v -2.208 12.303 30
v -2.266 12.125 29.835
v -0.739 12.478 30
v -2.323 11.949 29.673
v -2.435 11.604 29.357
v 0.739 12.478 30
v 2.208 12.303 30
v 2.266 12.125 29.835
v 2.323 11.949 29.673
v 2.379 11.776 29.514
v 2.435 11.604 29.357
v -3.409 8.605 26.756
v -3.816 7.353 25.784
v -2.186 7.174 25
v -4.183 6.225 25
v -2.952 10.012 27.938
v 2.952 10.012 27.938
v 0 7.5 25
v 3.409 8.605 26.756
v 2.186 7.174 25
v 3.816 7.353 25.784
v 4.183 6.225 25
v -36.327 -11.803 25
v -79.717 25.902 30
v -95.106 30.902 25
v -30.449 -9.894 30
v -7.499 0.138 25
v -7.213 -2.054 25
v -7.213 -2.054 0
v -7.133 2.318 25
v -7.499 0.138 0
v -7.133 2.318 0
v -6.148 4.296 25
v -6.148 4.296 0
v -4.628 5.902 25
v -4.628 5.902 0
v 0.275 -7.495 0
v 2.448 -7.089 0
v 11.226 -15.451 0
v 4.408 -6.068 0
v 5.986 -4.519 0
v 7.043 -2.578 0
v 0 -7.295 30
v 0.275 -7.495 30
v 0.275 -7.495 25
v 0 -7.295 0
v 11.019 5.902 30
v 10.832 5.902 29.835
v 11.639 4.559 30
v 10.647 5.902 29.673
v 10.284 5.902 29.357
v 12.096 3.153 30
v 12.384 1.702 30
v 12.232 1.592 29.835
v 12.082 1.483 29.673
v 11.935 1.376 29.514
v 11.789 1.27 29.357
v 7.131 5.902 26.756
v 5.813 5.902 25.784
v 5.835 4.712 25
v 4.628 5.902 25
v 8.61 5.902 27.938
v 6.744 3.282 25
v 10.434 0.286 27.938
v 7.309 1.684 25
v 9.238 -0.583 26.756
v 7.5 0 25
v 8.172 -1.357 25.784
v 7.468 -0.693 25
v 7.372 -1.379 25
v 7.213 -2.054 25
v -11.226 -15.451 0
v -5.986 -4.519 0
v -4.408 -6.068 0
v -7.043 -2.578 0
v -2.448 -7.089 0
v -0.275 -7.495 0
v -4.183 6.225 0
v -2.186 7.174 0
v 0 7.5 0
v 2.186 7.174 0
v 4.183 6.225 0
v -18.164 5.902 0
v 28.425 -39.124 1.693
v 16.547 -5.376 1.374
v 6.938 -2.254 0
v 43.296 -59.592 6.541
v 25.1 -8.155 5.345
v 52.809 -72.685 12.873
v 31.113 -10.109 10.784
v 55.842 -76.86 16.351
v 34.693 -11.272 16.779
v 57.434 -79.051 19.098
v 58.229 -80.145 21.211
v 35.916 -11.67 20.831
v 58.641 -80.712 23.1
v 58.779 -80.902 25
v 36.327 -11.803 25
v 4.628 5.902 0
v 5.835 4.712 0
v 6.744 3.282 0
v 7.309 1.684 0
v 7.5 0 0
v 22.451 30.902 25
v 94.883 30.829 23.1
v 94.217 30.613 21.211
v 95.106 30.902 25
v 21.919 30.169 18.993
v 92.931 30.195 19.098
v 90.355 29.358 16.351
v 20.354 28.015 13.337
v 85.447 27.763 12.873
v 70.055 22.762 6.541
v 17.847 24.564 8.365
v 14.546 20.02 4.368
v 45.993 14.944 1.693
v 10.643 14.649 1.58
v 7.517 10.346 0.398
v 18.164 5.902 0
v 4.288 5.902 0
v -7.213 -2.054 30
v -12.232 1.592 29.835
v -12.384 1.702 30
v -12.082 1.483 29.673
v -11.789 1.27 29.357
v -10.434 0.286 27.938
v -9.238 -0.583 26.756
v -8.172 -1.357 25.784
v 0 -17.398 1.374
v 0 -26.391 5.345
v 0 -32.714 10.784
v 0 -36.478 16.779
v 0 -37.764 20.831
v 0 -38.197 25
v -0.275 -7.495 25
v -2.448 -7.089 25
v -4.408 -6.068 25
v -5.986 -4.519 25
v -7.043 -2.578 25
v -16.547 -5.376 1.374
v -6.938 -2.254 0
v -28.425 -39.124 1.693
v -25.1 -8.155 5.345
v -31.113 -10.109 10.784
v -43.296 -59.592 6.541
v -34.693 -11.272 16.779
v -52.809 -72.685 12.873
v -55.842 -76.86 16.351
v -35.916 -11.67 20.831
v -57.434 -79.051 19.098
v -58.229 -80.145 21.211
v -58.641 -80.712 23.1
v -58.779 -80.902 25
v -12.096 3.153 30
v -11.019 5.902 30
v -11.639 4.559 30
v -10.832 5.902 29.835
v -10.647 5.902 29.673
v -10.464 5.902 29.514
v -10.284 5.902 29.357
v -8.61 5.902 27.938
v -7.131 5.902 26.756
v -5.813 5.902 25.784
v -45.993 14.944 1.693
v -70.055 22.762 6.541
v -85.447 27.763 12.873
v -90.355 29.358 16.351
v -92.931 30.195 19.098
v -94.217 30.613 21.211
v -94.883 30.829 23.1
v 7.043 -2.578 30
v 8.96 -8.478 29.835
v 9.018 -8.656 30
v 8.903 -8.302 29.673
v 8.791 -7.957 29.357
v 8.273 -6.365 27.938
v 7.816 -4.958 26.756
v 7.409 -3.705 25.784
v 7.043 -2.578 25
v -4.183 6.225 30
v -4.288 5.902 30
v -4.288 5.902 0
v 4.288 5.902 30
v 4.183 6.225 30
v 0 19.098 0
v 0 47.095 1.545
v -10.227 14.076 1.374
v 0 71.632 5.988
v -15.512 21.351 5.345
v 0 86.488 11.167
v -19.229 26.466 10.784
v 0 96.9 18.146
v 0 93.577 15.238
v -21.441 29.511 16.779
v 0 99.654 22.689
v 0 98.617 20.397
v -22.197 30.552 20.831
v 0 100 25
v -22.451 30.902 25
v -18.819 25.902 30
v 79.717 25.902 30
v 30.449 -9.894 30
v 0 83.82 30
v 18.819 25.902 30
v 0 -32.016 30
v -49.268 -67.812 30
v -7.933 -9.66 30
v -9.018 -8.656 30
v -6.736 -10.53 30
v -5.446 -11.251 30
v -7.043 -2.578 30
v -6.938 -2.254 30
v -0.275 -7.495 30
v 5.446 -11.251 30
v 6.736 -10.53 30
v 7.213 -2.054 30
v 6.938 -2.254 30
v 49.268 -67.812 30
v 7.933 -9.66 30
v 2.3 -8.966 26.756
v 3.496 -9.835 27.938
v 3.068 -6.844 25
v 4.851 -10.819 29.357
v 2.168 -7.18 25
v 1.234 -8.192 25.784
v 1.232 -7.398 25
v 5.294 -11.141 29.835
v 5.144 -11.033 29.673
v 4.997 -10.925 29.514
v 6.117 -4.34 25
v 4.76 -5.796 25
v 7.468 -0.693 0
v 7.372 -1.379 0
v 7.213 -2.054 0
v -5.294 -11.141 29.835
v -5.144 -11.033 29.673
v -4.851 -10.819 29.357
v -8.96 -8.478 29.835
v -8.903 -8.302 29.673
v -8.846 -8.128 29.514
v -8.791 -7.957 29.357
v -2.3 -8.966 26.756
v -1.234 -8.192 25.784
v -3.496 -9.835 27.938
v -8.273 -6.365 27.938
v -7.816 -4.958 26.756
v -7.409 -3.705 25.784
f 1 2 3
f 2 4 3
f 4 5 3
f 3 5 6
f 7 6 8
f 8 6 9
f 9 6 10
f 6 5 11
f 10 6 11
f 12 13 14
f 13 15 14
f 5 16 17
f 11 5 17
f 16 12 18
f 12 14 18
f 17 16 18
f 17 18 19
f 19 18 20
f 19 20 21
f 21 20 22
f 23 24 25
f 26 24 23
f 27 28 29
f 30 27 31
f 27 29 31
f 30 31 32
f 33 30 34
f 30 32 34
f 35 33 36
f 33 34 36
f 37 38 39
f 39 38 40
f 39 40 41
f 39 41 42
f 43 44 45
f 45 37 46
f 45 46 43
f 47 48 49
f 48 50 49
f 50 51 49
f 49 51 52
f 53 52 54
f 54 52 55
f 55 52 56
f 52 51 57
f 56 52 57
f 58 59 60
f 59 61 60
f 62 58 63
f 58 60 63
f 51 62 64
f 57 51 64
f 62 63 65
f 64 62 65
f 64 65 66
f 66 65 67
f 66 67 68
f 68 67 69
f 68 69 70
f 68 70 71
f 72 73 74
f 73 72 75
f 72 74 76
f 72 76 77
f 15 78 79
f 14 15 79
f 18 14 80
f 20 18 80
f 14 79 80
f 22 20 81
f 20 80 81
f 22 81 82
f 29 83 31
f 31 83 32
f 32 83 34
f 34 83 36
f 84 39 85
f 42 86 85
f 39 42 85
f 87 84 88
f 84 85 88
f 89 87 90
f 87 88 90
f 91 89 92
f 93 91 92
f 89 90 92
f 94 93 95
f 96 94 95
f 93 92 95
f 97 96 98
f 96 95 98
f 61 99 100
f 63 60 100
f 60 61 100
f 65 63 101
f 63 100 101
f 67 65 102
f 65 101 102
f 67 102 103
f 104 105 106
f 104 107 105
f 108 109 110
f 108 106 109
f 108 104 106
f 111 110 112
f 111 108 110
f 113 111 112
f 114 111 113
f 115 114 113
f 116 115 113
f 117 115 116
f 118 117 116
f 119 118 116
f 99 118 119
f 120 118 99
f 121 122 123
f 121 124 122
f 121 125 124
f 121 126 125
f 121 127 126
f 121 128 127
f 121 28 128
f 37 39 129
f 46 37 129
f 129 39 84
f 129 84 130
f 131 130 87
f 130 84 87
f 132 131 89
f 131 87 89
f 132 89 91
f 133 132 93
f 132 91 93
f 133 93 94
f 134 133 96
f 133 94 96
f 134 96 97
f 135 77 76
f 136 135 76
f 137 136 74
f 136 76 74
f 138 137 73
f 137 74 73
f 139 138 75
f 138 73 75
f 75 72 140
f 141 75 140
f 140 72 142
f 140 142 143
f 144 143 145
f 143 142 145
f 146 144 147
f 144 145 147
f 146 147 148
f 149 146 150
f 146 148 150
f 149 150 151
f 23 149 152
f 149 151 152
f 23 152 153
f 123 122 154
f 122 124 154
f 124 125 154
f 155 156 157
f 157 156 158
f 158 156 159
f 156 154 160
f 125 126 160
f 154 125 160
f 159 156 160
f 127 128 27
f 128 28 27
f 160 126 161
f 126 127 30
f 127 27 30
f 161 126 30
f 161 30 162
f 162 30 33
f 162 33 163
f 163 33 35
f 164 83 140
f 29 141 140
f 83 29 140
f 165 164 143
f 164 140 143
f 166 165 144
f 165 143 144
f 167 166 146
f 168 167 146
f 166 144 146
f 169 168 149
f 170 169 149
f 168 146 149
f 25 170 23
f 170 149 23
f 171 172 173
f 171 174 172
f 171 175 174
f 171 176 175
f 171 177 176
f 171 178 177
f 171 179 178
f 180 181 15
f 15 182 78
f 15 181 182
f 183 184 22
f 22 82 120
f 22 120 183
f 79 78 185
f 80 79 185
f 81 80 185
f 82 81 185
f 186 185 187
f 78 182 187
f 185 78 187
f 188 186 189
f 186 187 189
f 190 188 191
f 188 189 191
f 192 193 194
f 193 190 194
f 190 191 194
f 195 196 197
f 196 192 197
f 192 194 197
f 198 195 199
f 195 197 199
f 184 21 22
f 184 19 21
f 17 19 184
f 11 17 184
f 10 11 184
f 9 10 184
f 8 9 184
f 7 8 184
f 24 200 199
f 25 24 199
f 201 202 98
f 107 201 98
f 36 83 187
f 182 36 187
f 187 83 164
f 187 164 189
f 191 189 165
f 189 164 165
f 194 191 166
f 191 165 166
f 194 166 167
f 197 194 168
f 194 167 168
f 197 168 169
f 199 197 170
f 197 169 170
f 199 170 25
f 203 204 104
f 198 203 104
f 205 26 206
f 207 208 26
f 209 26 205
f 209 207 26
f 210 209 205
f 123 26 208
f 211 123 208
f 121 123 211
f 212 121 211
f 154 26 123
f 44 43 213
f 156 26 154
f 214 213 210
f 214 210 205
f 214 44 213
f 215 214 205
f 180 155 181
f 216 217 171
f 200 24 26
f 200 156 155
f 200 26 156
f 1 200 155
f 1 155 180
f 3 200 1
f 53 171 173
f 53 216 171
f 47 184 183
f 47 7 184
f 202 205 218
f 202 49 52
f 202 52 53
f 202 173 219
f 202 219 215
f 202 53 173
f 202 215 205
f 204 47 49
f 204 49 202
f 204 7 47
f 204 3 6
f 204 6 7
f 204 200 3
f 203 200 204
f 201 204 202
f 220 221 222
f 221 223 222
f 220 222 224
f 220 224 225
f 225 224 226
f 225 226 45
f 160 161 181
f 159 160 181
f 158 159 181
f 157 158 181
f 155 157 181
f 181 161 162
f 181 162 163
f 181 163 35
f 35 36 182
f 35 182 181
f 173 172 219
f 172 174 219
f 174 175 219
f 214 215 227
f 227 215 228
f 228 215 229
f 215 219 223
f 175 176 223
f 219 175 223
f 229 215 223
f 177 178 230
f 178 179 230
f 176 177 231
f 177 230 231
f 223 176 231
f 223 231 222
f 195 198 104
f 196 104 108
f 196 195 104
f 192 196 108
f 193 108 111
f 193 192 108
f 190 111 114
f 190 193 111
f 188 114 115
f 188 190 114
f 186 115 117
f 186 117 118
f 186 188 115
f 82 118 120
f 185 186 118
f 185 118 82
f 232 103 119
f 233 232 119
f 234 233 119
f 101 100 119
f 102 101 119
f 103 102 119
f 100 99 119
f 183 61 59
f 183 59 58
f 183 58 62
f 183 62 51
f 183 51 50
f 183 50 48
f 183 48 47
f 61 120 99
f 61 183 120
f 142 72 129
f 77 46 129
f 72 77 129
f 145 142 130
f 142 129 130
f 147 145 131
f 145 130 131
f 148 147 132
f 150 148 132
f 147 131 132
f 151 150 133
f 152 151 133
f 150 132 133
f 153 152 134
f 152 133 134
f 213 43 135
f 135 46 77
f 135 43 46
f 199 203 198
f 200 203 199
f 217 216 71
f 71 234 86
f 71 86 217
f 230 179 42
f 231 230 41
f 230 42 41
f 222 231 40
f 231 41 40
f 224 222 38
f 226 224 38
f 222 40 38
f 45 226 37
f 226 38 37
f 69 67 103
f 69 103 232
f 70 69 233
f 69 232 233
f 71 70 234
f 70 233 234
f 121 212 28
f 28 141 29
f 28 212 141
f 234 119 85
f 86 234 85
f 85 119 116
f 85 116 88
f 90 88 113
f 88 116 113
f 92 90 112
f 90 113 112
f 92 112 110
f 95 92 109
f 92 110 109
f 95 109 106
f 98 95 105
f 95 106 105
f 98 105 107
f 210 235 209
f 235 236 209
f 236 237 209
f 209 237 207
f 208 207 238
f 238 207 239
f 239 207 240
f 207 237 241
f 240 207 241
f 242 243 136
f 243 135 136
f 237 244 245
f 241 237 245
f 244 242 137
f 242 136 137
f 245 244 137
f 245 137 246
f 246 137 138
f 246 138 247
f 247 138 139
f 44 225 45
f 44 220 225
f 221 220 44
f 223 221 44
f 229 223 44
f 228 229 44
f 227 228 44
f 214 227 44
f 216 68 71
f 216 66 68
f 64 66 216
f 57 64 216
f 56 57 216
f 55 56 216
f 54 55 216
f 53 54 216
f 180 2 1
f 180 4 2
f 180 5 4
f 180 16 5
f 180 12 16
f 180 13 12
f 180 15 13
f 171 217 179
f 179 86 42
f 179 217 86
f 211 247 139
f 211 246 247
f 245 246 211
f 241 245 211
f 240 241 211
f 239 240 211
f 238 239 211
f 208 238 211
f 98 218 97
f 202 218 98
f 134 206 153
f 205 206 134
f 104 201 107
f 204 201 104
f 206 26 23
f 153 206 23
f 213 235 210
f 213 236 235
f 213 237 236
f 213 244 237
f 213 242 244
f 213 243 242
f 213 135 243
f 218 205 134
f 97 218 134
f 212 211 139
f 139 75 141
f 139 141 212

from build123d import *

# Parameters (mm, degrees)
F1_DEPTH     = 30
F2_SIZE      = 5
F3_R         = 24.99999
F5_DEPTH     = 35
F6_T4_ANGLE  = 264.2993733481
F6_T11_ANGLE = 264.2993733481
F6_T18_ANGLE = 264.2993733481
F6_T24_ANGLE = 264.2993733481
F6_T30_ANGLE = 264.2993733481
F6_T37_ANGLE = 264.2993733481
F6_T44_ANGLE = 264.2993733481
F6_T51_ANGLE = 264.2993733481
F6_T57_ANGLE = 264.2993733481
F6_T63_ANGLE = 264.2993733481
F6_T70_ANGLE = 264.299373348
F6_T77_ANGLE = 264.299373348
F6_T84_ANGLE = 264.299373348


# Not quite as in the source:
# - a fillet or chamfer that OpenCascade refuses, or shapes differently, is made with other operations: its cross-section is extruded or revolved along the edge and cut away or added
# - a fillet or chamfer is up to 0.001 mm smaller than in the source, because OpenCascade refuses the exact size


with BuildPart() as f1:
    # F0 (on Top) → F1 (new body)
    with BuildSketch(Plane.XY):
        Polygon((22.451398829, 30.9016994375), (0, 100), (-22.451398829, 30.9016994375), (-95.1056516295, 30.9016994375), (-36.3271264003, -11.803398875), (-58.7785252292, -80.9016994375), (0, -38.196601125), (58.7785252292, -80.9016994375), (36.3271264003, -11.803398875), (95.1056516295, 30.9016994375), align=None)
    extrude(amount=F1_DEPTH)

    # F2
    f2_edges = [f1.edges().sort_by_distance(p)[0] for p in [
        (65.716389, 9.54915, 30),
        (58.778525, 30.901699, 30),
        (11.225699, 65.45085, 30),
        (-11.225699, 65.45085, 30),
        (-58.778525, 30.901699, 30),
        (-65.716389, 9.54915, 30),
        (-47.552826, -46.352549, 30),
        (-29.389263, -59.54915, 30),
        (29.389263, -59.54915, 30),
        (47.552826, -46.352549, 30),
    ]]
    chamfer(f2_edges, length=F2_SIZE)

    # F3 (radius 25 in the source; OpenCascade refuses exactly that, so slightly less here)
    f3_edges = [f1.edges().sort_by_distance(p)[0] for p in [
        (65.716389, 9.54915, 0),
        (58.778525, 30.901699, 0),
        (11.225699, 65.45085, 0),
        (-11.225699, 65.45085, 0),
        (-58.778525, 30.901699, 0),
        (-65.716389, 9.54915, 0),
        (-47.552826, -46.352549, 0),
        (-29.389263, -59.54915, 0),
        (29.389263, -59.54915, 0),
        (47.552826, -46.352549, 0),
    ]]
    fillet(f3_edges, radius=F3_R)

    # F4 (on face) → F5 (cut)
    with BuildSketch(Plane(origin=(0, 0, 0), x_dir=(1, 0, 0), z_dir=(0, 0, -1))):
        with BuildLine():
            ThreePointArc((4.6281557575, -5.9017094375), (6.7439294251, -3.2816788249), (7.5, 0))
            ThreePointArc((7.5, 0), (7.4279525521, 1.0370732295), (7.2131944311, 2.0542215312))
            Line((7.2131944311, 2.0542215312), (6.9378755413, 2.2542524134))
            Line((6.9378755413, 2.2542524134), (7.0430379995, 2.5779091795))
            ThreePointArc((7.0430379995, 2.5779091795), (4.4083893922, 6.0676274578), (0.2753188897, 7.4949449303))
            Line((0.2753188897, 7.4949449303), (0, 7.2949140482))
            Line((0, 7.2949140482), (-0.2753188897, 7.4949449303))
            ThreePointArc((-0.2753188897, 7.4949449303), (-4.4083893922, 6.0676274578), (-7.0430379995, 2.5779091795))
            Line((-7.0430379995, 2.5779091795), (-6.9378755413, 2.2542524134))
            Line((-6.9378755413, 2.2542524134), (-7.2131944311, 2.0542215312))
            ThreePointArc((-7.2131944311, 2.0542215312), (-7.1329238722, -2.3176274578), (-4.6281557575, -5.9017094375))
            Line((-4.6281557575, -5.9017094375), (-4.2878428943, -5.9017094375))
            Line((-4.2878428943, -5.9017094375), (-4.1826804361, -6.2253662036))
            ThreePointArc((-4.1826804361, -6.2253662036), (0, -7.5), (4.1826804361, -6.2253662036))
            Line((4.1826804361, -6.2253662036), (4.2878428943, -5.9017094375))
            Line((4.2878428943, -5.9017094375), (4.6281557575, -5.9017094375))
        make_face()
    extrude(amount=-F5_DEPTH, mode=Mode.SUBTRACT)

    # F6: chamfer of 5 on 5 edges, made by hand


with BuildPart() as f6_tool2:
    # F6_s3 → F6_t4 (revolve)
    with BuildSketch(Plane(origin=(0, 0, 0), x_dir=(0, 0, 1), z_dir=(0.9124797315, 0.4091219129, 0))):
        Polygon((30, 12.5), (25, 7.5), (30, 7.5), align=None)
    revolve(axis=Axis((0, 0, 30), (0, 0, -1)), revolution_arc=F6_T4_ANGLE)

    split(bisect_by=Plane(origin=(-5.6128592178, 1.823728512, 0), x_dir=(0, 0, 1), z_dir=(0.9510565163, -0.3090169944, 0)), keep=Keep.TOP)

    split(bisect_by=Plane(origin=(-3.4689377707, -4.7745832308, 0), x_dir=(0, 0, 1), z_dir=(0.5877852523, 0.8090169944, 0)), keep=Keep.TOP)

    split(bisect_by=Plane(origin=(5.6128592178, 1.823728512, 0), x_dir=(0, 0, 1), z_dir=(-0.9510565163, -0.3090169944, 0)), keep=Keep.TOP)


with BuildPart() as f1_1:
    add(f1.part)

    # F6_t1: cut F6_tool2
    add(f6_tool2.part, mode=Mode.SUBTRACT)


with BuildPart() as f6_tool9:
    # F6_s10 → F6_t11 (revolve)
    with BuildSketch(Plane(origin=(0, 0, 0), x_dir=(0, 0, 1), z_dir=(0.9124797315, 0.4091219129, 0))):
        Polygon((30, 12.5), (25, 7.5), (30, 7.5), align=None)
    revolve(axis=Axis((0, 0, 30), (0, 0, -1)), revolution_arc=F6_T11_ANGLE)

    split(bisect_by=Plane.XZ.offset(-5.9017094375), keep=Keep.TOP)

    split(bisect_by=Plane(origin=(-5.6128592178, 1.823728512, 0), x_dir=(0, 0, 1), z_dir=(0.9510565163, -0.3090169944, 0)), keep=Keep.TOP)

    split(bisect_by=Plane(origin=(3.4689377707, -4.7745832308, 0), x_dir=(0, 0, 1), z_dir=(-0.5877852523, 0.8090169944, 0)), keep=Keep.TOP)


with BuildPart() as f1_2:
    add(f1_1.part)

    # F6_t8: cut F6_tool9
    add(f6_tool9.part, mode=Mode.SUBTRACT)


with BuildPart() as f6_tool16:
    # F6_s17 → F6_t18 (revolve)
    with BuildSketch(Plane(origin=(0, 0, 0), x_dir=(0, 0, 1), z_dir=(0.9124797315, 0.4091219129, 0))):
        Polygon((30, 12.5), (25, 7.5), (30, 7.5), align=None)
    revolve(axis=Axis((0, 0, 30), (0, 0, -1)), revolution_arc=F6_T18_ANGLE)

    split(bisect_by=Plane.XZ.offset(-5.9017094375), keep=Keep.TOP)

    split(bisect_by=Plane(origin=(-3.4689377707, -4.7745832308, 0), x_dir=(0, 0, 1), z_dir=(0.5877852523, 0.8090169944, 0)), keep=Keep.TOP)


with BuildPart() as f1_3:
    add(f1_2.part)

    # F6_t15: cut F6_tool16
    add(f6_tool16.part, mode=Mode.SUBTRACT)


with BuildPart() as f6_tool22:
    # F6_s23 → F6_t24 (revolve)
    with BuildSketch(Plane(origin=(0, 0, 0), x_dir=(0, 0, 1), z_dir=(0.6710698053, -0.7413941707, 0))):
        Polygon((30, 12.5), (25, 7.5), (30, 7.5), align=None)
    revolve(axis=Axis((0, 0, 30), (0, 0, -1)), revolution_arc=F6_T24_ANGLE)

    split(bisect_by=Plane(origin=(5.6128592178, 1.823728512, 0), x_dir=(0, 0, 1), z_dir=(-0.9510565163, -0.3090169944, 0)), keep=Keep.TOP)

    split(bisect_by=Plane(origin=(-5.6128592178, 1.823728512, 0), x_dir=(0, 0, 1), z_dir=(0.9510565163, -0.3090169944, 0)), keep=Keep.TOP)


with BuildPart() as f1_4:
    add(f1_3.part)

    # F6_t21: cut F6_tool22
    add(f6_tool22.part, mode=Mode.SUBTRACT)


with BuildPart() as f6_tool28:
    # F6_s29 → F6_t30 (revolve)
    with BuildSketch(Plane(origin=(0, 0, 0), x_dir=(0, 0, 1), z_dir=(0.6710698053, -0.7413941707, 0))):
        Polygon((30, 12.5), (25, 7.5), (30, 7.5), align=None)
    revolve(axis=Axis((0, 0, 30), (0, 0, -1)), revolution_arc=F6_T30_ANGLE)

    split(bisect_by=Plane(origin=(3.4689377707, -4.7745832308, 0), x_dir=(0, 0, 1), z_dir=(-0.5877852523, 0.8090169944, 0)), keep=Keep.TOP)

    split(bisect_by=Plane.XZ.offset(-5.9017094375), keep=Keep.TOP)

    split(bisect_by=Plane(origin=(-3.4689377707, -4.7745832308, 0), x_dir=(0, 0, 1), z_dir=(0.5877852523, 0.8090169944, 0)), keep=Keep.TOP)


with BuildPart() as f1_5:
    add(f1_4.part)

    # F6_t27: cut F6_tool28
    add(f6_tool28.part, mode=Mode.SUBTRACT)


with BuildPart() as f6_tool35:
    # F6_s36 → F6_t37 (revolve)
    with BuildSketch(Plane(origin=(0, 0, 0), x_dir=(0, 0, 1), z_dir=(-0.497735783, -0.8673287095, 0))):
        Polygon((30, 12.5), (25, 7.5), (30, 7.5), align=None)
    revolve(axis=Axis((0, 0, 30), (0, 0, -1)), revolution_arc=F6_T37_ANGLE)

    split(bisect_by=Plane(origin=(5.6128592178, 1.823728512, 0), x_dir=(0, 0, 1), z_dir=(-0.9510565163, -0.3090169944, 0)), keep=Keep.TOP)

    split(bisect_by=Plane.XZ.offset(-5.9017094375), keep=Keep.TOP)

    split(bisect_by=Plane(origin=(-3.4689377707, -4.7745832308, 0), x_dir=(0, 0, 1), z_dir=(0.5877852523, 0.8090169944, 0)), keep=Keep.TOP)


with BuildPart() as f1_6:
    add(f1_5.part)

    # F6_t34: cut F6_tool35
    add(f6_tool35.part, mode=Mode.SUBTRACT)


with BuildPart() as f6_tool42:
    # F6_s43 → F6_t44 (revolve)
    with BuildSketch(Plane(origin=(0, 0, 0), x_dir=(0, 0, 1), z_dir=(-0.497735783, -0.8673287095, 0))):
        Polygon((30, 12.5), (25, 7.5), (30, 7.5), align=None)
    revolve(axis=Axis((0, 0, 30), (0, 0, -1)), revolution_arc=F6_T44_ANGLE)

    split(bisect_by=Plane(origin=(3.4689377707, -4.7745832308, 0), x_dir=(0, 0, 1), z_dir=(-0.5877852523, 0.8090169944, 0)), keep=Keep.TOP)

    split(bisect_by=Plane(origin=(5.6128592178, 1.823728512, 0), x_dir=(0, 0, 1), z_dir=(-0.9510565163, -0.3090169944, 0)), keep=Keep.TOP)

    split(bisect_by=Plane(origin=(-5.6128592178, 1.823728512, 0), x_dir=(0, 0, 1), z_dir=(0.9510565163, -0.3090169944, 0)), keep=Keep.TOP)


with BuildPart() as f1_7:
    add(f1_6.part)

    # F6_t41: cut F6_tool42
    add(f6_tool42.part, mode=Mode.SUBTRACT)


with BuildPart() as f6_tool49:
    # F6_s50 → F6_t51 (revolve)
    with BuildSketch(Plane(origin=(0, 0, 0), x_dir=(0, 0, 1), z_dir=(-0.497735783, -0.8673287095, 0))):
        Polygon((30, 12.5), (25, 7.5), (30, 7.5), align=None)
    revolve(axis=Axis((0, 0, 30), (0, 0, -1)), revolution_arc=F6_T51_ANGLE)

    split(bisect_by=Plane(origin=(3.4689377707, -4.7745832308, 0), x_dir=(0, 0, 1), z_dir=(-0.5877852523, 0.8090169944, 0)), keep=Keep.TOP)

    split(bisect_by=Plane.XZ.offset(-5.9017094375), keep=Keep.TOP)


with BuildPart() as f1_8:
    add(f1_7.part)

    # F6_t48: cut F6_tool49
    add(f6_tool49.part, mode=Mode.SUBTRACT)


with BuildPart() as f6_tool55:
    # F6_s56 → F6_t57 (revolve)
    with BuildSketch(Plane(origin=(0, 0, 0), x_dir=(0, 0, 1), z_dir=(-0.9786874366, 0.2053555488, 0))):
        Polygon((30, 12.5), (25, 7.5), (30, 7.5), align=None)
    revolve(axis=Axis((0, 0, 30), (0, 0, -1)), revolution_arc=F6_T57_ANGLE)

    split(bisect_by=Plane(origin=(5.6128592178, 1.823728512, 0), x_dir=(0, 0, 1), z_dir=(-0.9510565163, -0.3090169944, 0)), keep=Keep.TOP)

    split(bisect_by=Plane(origin=(-3.4689377707, -4.7745832308, 0), x_dir=(0, 0, 1), z_dir=(0.5877852523, 0.8090169944, 0)), keep=Keep.TOP)


with BuildPart() as f1_9:
    add(f1_8.part)

    # F6_t54: cut F6_tool55
    add(f6_tool55.part, mode=Mode.SUBTRACT)


with BuildPart() as f6_tool61:
    # F6_s62 → F6_t63 (revolve)
    with BuildSketch(Plane(origin=(0, 0, 0), x_dir=(0, 0, 1), z_dir=(-0.9786874366, 0.2053555488, 0))):
        Polygon((30, 12.5), (25, 7.5), (30, 7.5), align=None)
    revolve(axis=Axis((0, 0, 30), (0, 0, -1)), revolution_arc=F6_T63_ANGLE)

    split(bisect_by=Plane(origin=(3.4689377707, -4.7745832308, 0), x_dir=(0, 0, 1), z_dir=(-0.5877852523, 0.8090169944, 0)), keep=Keep.TOP)

    split(bisect_by=Plane.XZ.offset(-5.9017094375), keep=Keep.TOP)

    split(bisect_by=Plane(origin=(-5.6128592178, 1.823728512, 0), x_dir=(0, 0, 1), z_dir=(0.9510565163, -0.3090169944, 0)), keep=Keep.TOP)


with BuildPart() as f1_10:
    add(f1_9.part)

    # F6_t60: cut F6_tool61
    add(f6_tool61.part, mode=Mode.SUBTRACT)


with BuildPart() as f6_tool68:
    # F6_s69 → F6_t70 (revolve)
    with BuildSketch(Plane(origin=(0, 0, 0), x_dir=(0, 0, 1), z_dir=(-0.1071263172, 0.9942454185, 0))):
        Polygon((30, 12.5), (25, 7.5), (30, 7.5), align=None)
    revolve(axis=Axis((0, 0, 30), (0, 0, -1)), revolution_arc=F6_T70_ANGLE)

    split(bisect_by=Plane(origin=(3.4689377707, -4.7745832308, 0), x_dir=(0, 0, 1), z_dir=(-0.5877852523, 0.8090169944, 0)), keep=Keep.TOP)

    split(bisect_by=Plane(origin=(-3.4689377707, -4.7745832308, 0), x_dir=(0, 0, 1), z_dir=(0.5877852523, 0.8090169944, 0)), keep=Keep.TOP)

    split(bisect_by=Plane.XZ.offset(-5.9017094375), keep=Keep.TOP)


with BuildPart() as f1_11:
    add(f1_10.part)

    # F6_t67: cut F6_tool68
    add(f6_tool68.part, mode=Mode.SUBTRACT)


with BuildPart() as f6_tool75:
    # F6_s76 → F6_t77 (revolve)
    with BuildSketch(Plane(origin=(0, 0, 0), x_dir=(0, 0, 1), z_dir=(-0.1071263172, 0.9942454185, 0))):
        Polygon((30, 12.5), (25, 7.5), (30, 7.5), align=None)
    revolve(axis=Axis((0, 0, 30), (0, 0, -1)), revolution_arc=F6_T77_ANGLE)

    split(bisect_by=Plane(origin=(5.6128592178, 1.823728512, 0), x_dir=(0, 0, 1), z_dir=(-0.9510565163, -0.3090169944, 0)), keep=Keep.TOP)

    split(bisect_by=Plane(origin=(-5.6128592178, 1.823728512, 0), x_dir=(0, 0, 1), z_dir=(0.9510565163, -0.3090169944, 0)), keep=Keep.TOP)

    split(bisect_by=Plane(origin=(-3.4689377707, -4.7745832308, 0), x_dir=(0, 0, 1), z_dir=(0.5877852523, 0.8090169944, 0)), keep=Keep.TOP)


with BuildPart() as f1_12:
    add(f1_11.part)

    # F6_t74: cut F6_tool75
    add(f6_tool75.part, mode=Mode.SUBTRACT)


with BuildPart() as f6_tool82:
    # F6_s83 → F6_t84 (revolve)
    with BuildSketch(Plane(origin=(0, 0, 0), x_dir=(0, 0, 1), z_dir=(-0.1071263172, 0.9942454185, 0))):
        Polygon((30, 12.5), (25, 7.5), (30, 7.5), align=None)
    revolve(axis=Axis((0, 0, 30), (0, 0, -1)), revolution_arc=F6_T84_ANGLE)

    split(bisect_by=Plane(origin=(3.4689377707, -4.7745832308, 0), x_dir=(0, 0, 1), z_dir=(-0.5877852523, 0.8090169944, 0)), keep=Keep.TOP)

    split(bisect_by=Plane(origin=(-5.6128592178, 1.823728512, 0), x_dir=(0, 0, 1), z_dir=(0.9510565163, -0.3090169944, 0)), keep=Keep.TOP)


with BuildPart() as f1_13:
    add(f1_12.part)

    # F6_t81: cut F6_tool82
    add(f6_tool82.part, mode=Mode.SUBTRACT)


solid = f1_13.part
